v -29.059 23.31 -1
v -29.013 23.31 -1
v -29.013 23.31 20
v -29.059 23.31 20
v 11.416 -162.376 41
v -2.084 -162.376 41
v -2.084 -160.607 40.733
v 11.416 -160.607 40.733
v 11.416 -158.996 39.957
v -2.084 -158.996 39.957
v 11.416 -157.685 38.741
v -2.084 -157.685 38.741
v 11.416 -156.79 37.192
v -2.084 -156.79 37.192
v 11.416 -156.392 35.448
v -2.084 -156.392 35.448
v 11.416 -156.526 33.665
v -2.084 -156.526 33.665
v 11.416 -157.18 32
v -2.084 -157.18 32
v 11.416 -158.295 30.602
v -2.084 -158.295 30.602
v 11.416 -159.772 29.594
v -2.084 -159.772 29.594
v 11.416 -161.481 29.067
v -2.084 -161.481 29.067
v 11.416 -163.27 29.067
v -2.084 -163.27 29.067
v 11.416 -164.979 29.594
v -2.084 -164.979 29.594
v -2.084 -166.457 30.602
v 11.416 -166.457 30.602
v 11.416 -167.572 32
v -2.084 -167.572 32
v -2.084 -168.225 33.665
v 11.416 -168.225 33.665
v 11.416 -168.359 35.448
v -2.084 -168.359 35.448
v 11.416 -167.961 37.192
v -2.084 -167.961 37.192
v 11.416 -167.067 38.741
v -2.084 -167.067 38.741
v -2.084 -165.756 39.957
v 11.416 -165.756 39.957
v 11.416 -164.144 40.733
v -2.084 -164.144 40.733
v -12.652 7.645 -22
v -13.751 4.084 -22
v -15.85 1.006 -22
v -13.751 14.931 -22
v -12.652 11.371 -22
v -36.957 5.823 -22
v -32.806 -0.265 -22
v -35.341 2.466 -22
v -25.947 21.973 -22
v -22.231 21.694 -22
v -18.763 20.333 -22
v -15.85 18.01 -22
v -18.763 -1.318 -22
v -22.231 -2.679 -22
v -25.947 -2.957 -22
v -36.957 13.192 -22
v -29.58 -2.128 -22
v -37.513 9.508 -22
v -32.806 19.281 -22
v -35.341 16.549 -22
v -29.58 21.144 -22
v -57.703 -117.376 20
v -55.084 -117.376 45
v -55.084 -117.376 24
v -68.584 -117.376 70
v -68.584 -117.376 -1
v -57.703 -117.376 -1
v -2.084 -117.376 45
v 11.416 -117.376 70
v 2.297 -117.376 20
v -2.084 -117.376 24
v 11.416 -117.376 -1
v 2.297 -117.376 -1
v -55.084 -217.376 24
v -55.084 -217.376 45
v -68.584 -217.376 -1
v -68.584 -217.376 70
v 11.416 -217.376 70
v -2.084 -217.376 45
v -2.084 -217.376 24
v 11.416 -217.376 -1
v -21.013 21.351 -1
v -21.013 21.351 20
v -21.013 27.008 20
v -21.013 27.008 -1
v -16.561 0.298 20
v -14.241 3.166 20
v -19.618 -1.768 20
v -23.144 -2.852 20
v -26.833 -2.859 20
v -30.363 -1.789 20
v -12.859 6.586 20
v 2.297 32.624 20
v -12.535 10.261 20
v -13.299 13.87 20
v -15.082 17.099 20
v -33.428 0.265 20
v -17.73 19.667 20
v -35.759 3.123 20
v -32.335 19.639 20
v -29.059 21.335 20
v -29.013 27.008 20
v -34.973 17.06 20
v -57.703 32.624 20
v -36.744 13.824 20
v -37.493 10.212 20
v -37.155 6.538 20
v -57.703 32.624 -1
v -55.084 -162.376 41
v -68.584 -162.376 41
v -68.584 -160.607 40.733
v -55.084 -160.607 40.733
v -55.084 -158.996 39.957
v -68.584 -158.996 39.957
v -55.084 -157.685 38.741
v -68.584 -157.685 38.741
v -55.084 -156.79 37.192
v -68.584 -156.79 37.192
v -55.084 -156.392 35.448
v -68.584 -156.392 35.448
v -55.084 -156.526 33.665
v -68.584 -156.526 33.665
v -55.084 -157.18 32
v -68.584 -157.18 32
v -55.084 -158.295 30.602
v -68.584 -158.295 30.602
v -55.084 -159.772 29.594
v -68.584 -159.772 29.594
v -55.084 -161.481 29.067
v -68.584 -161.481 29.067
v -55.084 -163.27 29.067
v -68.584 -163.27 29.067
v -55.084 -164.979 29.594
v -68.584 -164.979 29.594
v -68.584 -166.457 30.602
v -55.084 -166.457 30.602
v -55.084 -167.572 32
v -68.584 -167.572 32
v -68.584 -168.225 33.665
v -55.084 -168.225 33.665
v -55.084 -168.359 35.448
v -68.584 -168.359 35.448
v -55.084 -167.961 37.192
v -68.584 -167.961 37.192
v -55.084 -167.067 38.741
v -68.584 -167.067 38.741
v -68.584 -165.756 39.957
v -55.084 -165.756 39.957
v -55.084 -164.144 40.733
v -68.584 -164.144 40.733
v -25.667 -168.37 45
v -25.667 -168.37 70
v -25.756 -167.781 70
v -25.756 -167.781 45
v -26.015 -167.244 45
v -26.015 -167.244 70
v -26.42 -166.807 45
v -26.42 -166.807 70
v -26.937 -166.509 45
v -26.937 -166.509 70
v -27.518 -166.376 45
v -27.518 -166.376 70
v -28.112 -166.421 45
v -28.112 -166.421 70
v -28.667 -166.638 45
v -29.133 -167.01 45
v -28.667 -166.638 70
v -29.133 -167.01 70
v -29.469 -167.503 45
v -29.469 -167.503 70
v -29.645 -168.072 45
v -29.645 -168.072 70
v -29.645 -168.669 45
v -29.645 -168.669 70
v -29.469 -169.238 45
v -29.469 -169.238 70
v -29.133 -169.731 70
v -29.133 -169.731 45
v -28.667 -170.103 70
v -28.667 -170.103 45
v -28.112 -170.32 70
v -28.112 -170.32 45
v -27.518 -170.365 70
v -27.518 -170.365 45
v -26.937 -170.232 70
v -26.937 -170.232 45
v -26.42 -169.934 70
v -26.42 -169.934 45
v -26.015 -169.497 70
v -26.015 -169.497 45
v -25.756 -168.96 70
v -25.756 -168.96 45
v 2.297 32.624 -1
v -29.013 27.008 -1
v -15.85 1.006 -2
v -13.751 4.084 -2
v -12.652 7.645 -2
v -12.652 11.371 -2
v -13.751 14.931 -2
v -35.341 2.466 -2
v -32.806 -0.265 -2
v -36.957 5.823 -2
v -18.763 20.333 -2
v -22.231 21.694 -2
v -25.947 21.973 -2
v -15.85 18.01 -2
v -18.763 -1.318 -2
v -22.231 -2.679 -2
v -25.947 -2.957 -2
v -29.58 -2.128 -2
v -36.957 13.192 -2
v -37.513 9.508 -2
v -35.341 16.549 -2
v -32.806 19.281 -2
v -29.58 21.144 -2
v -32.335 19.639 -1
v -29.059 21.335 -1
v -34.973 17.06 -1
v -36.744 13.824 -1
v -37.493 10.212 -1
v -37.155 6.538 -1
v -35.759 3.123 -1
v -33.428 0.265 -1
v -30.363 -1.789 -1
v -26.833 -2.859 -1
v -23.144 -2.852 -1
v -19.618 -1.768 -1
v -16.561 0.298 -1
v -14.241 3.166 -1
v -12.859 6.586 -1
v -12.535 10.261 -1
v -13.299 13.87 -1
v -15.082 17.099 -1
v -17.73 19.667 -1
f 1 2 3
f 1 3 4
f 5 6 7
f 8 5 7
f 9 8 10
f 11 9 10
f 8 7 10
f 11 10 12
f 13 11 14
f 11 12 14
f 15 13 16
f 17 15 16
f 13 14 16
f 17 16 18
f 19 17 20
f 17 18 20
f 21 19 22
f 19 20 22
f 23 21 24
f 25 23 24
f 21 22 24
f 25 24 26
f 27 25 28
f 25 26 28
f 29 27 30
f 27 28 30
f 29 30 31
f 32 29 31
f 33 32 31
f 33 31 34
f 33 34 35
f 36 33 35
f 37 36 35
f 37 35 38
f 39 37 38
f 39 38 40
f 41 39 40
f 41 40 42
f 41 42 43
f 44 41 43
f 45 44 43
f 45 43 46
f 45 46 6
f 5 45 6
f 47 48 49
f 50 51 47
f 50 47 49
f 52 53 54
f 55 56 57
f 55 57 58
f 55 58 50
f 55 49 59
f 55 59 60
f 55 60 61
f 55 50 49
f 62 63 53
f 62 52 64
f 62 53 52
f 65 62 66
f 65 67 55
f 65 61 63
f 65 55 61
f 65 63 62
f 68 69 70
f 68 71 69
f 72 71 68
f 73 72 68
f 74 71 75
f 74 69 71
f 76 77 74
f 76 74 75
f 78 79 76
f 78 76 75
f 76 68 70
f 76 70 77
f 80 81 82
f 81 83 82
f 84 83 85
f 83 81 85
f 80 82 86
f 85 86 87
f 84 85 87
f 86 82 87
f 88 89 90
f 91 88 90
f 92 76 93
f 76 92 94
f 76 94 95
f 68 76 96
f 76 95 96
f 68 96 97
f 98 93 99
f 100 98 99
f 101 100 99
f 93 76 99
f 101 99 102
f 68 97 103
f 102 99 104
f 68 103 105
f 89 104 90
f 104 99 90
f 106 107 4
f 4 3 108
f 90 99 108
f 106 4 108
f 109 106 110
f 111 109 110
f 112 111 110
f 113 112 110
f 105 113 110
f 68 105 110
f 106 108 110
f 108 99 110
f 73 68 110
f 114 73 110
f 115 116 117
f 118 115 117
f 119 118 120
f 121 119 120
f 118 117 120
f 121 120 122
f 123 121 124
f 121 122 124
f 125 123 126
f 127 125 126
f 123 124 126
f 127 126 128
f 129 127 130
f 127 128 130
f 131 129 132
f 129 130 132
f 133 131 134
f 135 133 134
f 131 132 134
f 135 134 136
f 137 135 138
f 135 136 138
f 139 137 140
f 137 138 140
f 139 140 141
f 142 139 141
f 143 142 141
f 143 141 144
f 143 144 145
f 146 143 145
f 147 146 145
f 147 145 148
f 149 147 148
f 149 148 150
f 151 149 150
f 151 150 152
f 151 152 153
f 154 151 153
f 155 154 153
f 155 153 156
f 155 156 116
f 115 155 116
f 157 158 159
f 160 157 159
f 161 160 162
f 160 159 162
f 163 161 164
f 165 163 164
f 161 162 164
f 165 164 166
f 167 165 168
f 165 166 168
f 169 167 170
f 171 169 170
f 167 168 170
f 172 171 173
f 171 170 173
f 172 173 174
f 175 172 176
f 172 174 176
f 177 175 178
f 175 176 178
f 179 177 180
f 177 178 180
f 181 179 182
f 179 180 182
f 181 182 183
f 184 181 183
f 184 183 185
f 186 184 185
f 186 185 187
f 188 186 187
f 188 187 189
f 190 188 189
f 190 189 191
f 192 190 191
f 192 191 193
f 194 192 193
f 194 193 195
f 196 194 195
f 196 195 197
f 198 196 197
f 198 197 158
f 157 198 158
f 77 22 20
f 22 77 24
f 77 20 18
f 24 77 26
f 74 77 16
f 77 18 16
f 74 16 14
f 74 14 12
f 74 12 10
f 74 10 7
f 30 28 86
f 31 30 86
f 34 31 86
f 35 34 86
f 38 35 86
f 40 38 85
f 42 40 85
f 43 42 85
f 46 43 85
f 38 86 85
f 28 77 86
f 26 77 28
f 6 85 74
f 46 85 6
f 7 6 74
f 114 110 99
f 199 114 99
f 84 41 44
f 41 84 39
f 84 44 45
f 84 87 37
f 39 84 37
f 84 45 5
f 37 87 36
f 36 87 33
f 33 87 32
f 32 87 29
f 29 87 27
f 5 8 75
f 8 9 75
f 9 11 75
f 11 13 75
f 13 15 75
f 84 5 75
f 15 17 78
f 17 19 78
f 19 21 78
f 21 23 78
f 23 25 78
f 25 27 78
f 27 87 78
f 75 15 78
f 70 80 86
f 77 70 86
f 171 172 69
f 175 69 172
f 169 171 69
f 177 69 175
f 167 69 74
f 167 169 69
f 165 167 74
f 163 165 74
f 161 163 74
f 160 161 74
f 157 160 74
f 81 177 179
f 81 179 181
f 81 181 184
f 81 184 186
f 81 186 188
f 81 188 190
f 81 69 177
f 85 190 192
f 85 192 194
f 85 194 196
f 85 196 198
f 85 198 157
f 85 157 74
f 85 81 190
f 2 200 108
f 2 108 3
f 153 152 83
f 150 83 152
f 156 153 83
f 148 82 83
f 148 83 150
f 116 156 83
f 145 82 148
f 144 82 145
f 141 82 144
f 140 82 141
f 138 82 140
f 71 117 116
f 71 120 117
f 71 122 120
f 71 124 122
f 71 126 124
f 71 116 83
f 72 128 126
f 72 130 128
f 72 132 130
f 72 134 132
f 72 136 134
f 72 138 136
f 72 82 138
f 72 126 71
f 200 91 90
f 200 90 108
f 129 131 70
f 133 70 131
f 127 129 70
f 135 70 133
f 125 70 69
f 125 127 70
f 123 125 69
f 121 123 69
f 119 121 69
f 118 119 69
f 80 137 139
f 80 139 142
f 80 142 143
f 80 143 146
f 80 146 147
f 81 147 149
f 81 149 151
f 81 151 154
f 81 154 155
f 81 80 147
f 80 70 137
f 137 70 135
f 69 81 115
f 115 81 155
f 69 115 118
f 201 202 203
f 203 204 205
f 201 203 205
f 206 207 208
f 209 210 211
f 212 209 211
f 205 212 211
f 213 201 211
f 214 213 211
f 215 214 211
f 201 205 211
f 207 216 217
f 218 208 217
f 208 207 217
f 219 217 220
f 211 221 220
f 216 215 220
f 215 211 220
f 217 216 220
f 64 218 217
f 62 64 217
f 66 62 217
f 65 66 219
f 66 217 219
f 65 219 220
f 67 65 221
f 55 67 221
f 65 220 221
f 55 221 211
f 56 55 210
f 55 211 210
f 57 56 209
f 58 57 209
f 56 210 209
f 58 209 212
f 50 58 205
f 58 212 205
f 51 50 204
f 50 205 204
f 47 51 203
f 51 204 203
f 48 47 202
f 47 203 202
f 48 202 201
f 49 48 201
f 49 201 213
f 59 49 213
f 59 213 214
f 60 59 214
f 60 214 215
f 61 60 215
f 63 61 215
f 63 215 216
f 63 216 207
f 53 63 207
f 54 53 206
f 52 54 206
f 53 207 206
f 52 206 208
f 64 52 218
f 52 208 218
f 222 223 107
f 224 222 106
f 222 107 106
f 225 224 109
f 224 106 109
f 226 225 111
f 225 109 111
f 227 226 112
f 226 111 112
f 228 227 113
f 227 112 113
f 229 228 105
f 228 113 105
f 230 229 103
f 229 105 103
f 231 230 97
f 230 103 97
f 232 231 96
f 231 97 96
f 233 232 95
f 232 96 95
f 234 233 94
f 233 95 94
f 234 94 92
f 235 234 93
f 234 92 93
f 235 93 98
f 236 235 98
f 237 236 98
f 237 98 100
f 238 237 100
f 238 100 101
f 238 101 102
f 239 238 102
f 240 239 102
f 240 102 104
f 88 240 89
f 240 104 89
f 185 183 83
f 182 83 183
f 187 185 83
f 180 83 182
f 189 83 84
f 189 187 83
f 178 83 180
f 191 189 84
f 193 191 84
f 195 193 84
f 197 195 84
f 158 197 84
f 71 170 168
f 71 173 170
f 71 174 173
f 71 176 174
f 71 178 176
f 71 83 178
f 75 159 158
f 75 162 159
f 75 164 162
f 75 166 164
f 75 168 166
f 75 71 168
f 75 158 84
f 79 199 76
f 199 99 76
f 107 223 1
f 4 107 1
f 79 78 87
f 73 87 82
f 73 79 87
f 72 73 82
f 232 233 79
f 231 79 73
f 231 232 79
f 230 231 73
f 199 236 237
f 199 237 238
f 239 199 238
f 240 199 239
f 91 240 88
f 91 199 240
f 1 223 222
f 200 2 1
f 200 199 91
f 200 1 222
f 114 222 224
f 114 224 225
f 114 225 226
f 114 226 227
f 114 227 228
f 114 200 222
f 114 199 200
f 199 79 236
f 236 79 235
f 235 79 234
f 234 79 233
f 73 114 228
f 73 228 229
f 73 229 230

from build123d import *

# Parameters (mm, degrees)
BOSS_EXTRUDE1_DEPTH      = 20
BOSS_EXTRUDE1_DEPTH_BACK = 1
SKETCH8_W                = 8
SKETCH8_H                = 15
CUT_EXTRUDE23_DEPTH      = 22
SKETCH9_W                = 80
SKETCH9_H                = 100
BOSS_EXTRUDE2_DEPTH      = 50
SKETCH11_W               = 53
SKETCH11_H               = 21
CUT_EXTRUDE24_DEPTH      = 251
SKETCH12_R               = 6
CUT_EXTRUDE25_DEPTH      = 81
SKETCH13_R               = 2
CUT_EXTRUDE26_DEPTH      = 30
SKETCH16_R               = 12.5
BOSS_EXTRUDE4_DEPTH      = 20


with BuildPart() as part:
    # Sketch1 → Boss-Extrude1 (new body, two sides)
    with BuildSketch(Plane.XY) as boss_extrude1_sk:
        Polygon((-57.702904495, 32.624334465), (2.297095505, 32.624334465), (2.297095505, -117.375665535), (18.465683408, -117.375665535), (11.415868661, -117.375665535), (11.415868661, -217.375665535), (-68.584131339, -217.375665535), (-68.584131339, -117.375665535), (-57.702904495, -117.375665535), align=None)
        with BuildLine():
            Line((-21.012791673, 27.00780152), (-29.012791673, 27.00780152))
            Line((-29.012791673, 27.00780152), (-29.012791673, 21.350520803))
            ThreePointArc((-29.012791673, 21.350520803), (-25.012791673, -2.99219848), (-21.012791673, 21.350520803))
            Line((-21.012791673, 21.350520803), (-21.012791673, 27.00780152))
        make_face(mode=Mode.SUBTRACT)
    extrude(amount=BOSS_EXTRUDE1_DEPTH)
    extrude(boss_extrude1_sk.sketch, amount=-BOSS_EXTRUDE1_DEPTH_BACK)

    # Sketch8 → Cut-Extrude23 (cut, through all)
    with BuildSketch(Plane(origin=(0, 0, -1), x_dir=(-1, 0, 0), z_dir=(0, 0, -1))):
        with Locations((25.059223965, 15.809886429)):
            Rectangle(SKETCH8_W, SKETCH8_H)
    extrude(amount=-CUT_EXTRUDE23_DEPTH, mode=Mode.SUBTRACT)

    # Sketch9 → Boss-Extrude2 (add)
    with BuildSketch(Plane.XY.offset(20)):
        with Locations((-28.584131339, -167.375665535)):
            Rectangle(SKETCH9_W, SKETCH9_H)
    extrude(amount=BOSS_EXTRUDE2_DEPTH)

    # Sketch11 → Cut-Extrude24 (cut, through all)
    with BuildSketch(Plane.XZ.offset(217.375665535)):
        with Locations((-28.584131339, 34.5)):
            Rectangle(SKETCH11_W, SKETCH11_H)
    extrude(amount=-CUT_EXTRUDE24_DEPTH, mode=Mode.SUBTRACT)

    # Sketch12 → Cut-Extrude25 (cut, through all)
    with BuildSketch(Plane.ZY.offset(68.584131339)):
        with Locations((35, -162.375665535)):
            Circle(SKETCH12_R)
    extrude(amount=-CUT_EXTRUDE25_DEPTH, mode=Mode.SUBTRACT)

    # Sketch13 → Cut-Extrude26 (cut)
    with BuildSketch(Plane.XY.offset(70)):
        with Locations((-27.66721479, -168.370466124)):
            Circle(SKETCH13_R)
    extrude(amount=-CUT_EXTRUDE26_DEPTH, mode=Mode.SUBTRACT)


with BuildPart() as body_2:
    # Sketch16 → Boss-Extrude4 (new body)
    with BuildSketch(Plane(origin=(-25.012791673, 9.50780152, -2), x_dir=(-1, 0, 0), z_dir=(0, 0, -1))):
        Circle(SKETCH16_R)
    extrude(amount=BOSS_EXTRUDE4_DEPTH)


solid = Compound([part.part, body_2.part])
